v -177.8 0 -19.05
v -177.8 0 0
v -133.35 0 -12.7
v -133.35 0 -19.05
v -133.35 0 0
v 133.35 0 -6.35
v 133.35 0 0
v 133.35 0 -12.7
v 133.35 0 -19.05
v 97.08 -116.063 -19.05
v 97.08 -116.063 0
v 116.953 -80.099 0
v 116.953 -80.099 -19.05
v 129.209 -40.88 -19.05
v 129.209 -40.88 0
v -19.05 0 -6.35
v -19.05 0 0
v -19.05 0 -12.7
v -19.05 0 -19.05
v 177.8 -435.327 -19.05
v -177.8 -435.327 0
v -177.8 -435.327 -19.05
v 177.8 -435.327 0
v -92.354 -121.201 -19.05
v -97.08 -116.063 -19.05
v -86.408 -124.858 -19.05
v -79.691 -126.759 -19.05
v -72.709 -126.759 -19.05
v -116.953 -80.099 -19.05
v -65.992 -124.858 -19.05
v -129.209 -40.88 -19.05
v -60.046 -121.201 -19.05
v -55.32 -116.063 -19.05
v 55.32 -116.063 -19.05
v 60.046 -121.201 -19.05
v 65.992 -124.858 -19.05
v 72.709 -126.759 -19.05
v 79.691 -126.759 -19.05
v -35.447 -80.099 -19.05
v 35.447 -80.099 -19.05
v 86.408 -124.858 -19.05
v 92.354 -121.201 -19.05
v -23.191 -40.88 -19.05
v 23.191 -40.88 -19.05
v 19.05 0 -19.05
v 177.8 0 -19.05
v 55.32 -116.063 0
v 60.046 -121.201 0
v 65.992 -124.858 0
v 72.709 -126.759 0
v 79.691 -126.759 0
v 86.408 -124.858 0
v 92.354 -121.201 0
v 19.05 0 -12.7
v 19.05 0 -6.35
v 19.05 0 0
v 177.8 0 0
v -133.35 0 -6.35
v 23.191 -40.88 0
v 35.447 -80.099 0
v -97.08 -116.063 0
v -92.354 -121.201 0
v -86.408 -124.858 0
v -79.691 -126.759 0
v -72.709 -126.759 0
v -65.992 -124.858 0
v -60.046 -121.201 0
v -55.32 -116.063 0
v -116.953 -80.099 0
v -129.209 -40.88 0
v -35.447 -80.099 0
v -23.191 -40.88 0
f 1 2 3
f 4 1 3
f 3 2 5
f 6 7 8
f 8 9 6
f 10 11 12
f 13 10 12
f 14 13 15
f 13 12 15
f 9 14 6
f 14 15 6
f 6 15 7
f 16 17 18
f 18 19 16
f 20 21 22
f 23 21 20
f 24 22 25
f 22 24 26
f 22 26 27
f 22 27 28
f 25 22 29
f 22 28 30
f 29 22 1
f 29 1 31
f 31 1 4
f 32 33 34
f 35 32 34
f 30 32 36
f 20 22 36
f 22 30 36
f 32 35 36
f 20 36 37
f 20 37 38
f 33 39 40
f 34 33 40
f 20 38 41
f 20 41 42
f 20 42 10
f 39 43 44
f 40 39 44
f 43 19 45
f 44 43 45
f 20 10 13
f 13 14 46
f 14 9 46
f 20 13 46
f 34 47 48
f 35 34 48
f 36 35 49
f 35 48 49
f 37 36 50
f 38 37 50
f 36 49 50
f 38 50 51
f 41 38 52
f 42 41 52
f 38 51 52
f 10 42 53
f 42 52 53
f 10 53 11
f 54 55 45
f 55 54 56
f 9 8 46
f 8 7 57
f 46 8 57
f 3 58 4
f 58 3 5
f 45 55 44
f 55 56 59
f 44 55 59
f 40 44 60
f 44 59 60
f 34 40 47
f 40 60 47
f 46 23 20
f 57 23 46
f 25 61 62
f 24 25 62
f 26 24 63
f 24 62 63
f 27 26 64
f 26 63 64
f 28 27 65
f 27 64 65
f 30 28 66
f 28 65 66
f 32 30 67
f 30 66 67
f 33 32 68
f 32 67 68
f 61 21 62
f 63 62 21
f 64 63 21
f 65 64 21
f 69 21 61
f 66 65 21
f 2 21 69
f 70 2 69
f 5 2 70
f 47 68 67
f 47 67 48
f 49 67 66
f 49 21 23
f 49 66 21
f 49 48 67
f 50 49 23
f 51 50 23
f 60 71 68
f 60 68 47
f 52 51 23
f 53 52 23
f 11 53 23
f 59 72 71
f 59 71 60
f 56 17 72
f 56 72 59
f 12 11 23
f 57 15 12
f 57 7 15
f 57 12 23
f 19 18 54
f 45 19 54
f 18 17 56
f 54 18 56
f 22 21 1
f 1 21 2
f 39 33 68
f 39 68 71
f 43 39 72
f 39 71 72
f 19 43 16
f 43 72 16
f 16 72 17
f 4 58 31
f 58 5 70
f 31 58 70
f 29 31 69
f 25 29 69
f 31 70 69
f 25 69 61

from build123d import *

# Parameters (mm, degrees)
F1_W     = 355.6
F1_H     = 435.326967
F2_DEPTH = 19.05
F3_DEPTH = 19.051


with BuildPart() as f2:
    # F1 (on Top) → F2 (new body)
    with BuildSketch(Plane.XY):
        with Locations((0, -217.663483)):
            Rectangle(F1_W, F1_H)
    extrude(amount=-F2_DEPTH)

    # F0 (on Top) → F3 (cut, through all)
    with BuildSketch(Plane.XY):
        with BuildLine():
            ThreePointArc((-97.080427, -116.062633), (-76.2, -127), (-55.319573, -116.062633))
            ThreePointArc((-55.319573, -116.062633), (-28.328574, -60.798883), (-19.05, 0))
            ThreePointArc((-19.05, 0), (-76.2, 57.15), (-133.35, 0))
            ThreePointArc((-133.35, 0), (-124.071426, -60.798883), (-97.080427, -116.062633))
        make_face()
        with BuildLine():
            ThreePointArc((19.05, 0), (28.328574, -60.798883), (55.319573, -116.062633))
            ThreePointArc((55.319573, -116.062633), (76.2, -127), (97.080427, -116.062633))
            ThreePointArc((97.080427, -116.062633), (124.071426, -60.798883), (133.35, 0))
            ThreePointArc((133.35, 0), (76.2, 57.15), (19.05, 0))
        make_face()
    extrude(amount=-F3_DEPTH, mode=Mode.SUBTRACT)


solid = f2.part
